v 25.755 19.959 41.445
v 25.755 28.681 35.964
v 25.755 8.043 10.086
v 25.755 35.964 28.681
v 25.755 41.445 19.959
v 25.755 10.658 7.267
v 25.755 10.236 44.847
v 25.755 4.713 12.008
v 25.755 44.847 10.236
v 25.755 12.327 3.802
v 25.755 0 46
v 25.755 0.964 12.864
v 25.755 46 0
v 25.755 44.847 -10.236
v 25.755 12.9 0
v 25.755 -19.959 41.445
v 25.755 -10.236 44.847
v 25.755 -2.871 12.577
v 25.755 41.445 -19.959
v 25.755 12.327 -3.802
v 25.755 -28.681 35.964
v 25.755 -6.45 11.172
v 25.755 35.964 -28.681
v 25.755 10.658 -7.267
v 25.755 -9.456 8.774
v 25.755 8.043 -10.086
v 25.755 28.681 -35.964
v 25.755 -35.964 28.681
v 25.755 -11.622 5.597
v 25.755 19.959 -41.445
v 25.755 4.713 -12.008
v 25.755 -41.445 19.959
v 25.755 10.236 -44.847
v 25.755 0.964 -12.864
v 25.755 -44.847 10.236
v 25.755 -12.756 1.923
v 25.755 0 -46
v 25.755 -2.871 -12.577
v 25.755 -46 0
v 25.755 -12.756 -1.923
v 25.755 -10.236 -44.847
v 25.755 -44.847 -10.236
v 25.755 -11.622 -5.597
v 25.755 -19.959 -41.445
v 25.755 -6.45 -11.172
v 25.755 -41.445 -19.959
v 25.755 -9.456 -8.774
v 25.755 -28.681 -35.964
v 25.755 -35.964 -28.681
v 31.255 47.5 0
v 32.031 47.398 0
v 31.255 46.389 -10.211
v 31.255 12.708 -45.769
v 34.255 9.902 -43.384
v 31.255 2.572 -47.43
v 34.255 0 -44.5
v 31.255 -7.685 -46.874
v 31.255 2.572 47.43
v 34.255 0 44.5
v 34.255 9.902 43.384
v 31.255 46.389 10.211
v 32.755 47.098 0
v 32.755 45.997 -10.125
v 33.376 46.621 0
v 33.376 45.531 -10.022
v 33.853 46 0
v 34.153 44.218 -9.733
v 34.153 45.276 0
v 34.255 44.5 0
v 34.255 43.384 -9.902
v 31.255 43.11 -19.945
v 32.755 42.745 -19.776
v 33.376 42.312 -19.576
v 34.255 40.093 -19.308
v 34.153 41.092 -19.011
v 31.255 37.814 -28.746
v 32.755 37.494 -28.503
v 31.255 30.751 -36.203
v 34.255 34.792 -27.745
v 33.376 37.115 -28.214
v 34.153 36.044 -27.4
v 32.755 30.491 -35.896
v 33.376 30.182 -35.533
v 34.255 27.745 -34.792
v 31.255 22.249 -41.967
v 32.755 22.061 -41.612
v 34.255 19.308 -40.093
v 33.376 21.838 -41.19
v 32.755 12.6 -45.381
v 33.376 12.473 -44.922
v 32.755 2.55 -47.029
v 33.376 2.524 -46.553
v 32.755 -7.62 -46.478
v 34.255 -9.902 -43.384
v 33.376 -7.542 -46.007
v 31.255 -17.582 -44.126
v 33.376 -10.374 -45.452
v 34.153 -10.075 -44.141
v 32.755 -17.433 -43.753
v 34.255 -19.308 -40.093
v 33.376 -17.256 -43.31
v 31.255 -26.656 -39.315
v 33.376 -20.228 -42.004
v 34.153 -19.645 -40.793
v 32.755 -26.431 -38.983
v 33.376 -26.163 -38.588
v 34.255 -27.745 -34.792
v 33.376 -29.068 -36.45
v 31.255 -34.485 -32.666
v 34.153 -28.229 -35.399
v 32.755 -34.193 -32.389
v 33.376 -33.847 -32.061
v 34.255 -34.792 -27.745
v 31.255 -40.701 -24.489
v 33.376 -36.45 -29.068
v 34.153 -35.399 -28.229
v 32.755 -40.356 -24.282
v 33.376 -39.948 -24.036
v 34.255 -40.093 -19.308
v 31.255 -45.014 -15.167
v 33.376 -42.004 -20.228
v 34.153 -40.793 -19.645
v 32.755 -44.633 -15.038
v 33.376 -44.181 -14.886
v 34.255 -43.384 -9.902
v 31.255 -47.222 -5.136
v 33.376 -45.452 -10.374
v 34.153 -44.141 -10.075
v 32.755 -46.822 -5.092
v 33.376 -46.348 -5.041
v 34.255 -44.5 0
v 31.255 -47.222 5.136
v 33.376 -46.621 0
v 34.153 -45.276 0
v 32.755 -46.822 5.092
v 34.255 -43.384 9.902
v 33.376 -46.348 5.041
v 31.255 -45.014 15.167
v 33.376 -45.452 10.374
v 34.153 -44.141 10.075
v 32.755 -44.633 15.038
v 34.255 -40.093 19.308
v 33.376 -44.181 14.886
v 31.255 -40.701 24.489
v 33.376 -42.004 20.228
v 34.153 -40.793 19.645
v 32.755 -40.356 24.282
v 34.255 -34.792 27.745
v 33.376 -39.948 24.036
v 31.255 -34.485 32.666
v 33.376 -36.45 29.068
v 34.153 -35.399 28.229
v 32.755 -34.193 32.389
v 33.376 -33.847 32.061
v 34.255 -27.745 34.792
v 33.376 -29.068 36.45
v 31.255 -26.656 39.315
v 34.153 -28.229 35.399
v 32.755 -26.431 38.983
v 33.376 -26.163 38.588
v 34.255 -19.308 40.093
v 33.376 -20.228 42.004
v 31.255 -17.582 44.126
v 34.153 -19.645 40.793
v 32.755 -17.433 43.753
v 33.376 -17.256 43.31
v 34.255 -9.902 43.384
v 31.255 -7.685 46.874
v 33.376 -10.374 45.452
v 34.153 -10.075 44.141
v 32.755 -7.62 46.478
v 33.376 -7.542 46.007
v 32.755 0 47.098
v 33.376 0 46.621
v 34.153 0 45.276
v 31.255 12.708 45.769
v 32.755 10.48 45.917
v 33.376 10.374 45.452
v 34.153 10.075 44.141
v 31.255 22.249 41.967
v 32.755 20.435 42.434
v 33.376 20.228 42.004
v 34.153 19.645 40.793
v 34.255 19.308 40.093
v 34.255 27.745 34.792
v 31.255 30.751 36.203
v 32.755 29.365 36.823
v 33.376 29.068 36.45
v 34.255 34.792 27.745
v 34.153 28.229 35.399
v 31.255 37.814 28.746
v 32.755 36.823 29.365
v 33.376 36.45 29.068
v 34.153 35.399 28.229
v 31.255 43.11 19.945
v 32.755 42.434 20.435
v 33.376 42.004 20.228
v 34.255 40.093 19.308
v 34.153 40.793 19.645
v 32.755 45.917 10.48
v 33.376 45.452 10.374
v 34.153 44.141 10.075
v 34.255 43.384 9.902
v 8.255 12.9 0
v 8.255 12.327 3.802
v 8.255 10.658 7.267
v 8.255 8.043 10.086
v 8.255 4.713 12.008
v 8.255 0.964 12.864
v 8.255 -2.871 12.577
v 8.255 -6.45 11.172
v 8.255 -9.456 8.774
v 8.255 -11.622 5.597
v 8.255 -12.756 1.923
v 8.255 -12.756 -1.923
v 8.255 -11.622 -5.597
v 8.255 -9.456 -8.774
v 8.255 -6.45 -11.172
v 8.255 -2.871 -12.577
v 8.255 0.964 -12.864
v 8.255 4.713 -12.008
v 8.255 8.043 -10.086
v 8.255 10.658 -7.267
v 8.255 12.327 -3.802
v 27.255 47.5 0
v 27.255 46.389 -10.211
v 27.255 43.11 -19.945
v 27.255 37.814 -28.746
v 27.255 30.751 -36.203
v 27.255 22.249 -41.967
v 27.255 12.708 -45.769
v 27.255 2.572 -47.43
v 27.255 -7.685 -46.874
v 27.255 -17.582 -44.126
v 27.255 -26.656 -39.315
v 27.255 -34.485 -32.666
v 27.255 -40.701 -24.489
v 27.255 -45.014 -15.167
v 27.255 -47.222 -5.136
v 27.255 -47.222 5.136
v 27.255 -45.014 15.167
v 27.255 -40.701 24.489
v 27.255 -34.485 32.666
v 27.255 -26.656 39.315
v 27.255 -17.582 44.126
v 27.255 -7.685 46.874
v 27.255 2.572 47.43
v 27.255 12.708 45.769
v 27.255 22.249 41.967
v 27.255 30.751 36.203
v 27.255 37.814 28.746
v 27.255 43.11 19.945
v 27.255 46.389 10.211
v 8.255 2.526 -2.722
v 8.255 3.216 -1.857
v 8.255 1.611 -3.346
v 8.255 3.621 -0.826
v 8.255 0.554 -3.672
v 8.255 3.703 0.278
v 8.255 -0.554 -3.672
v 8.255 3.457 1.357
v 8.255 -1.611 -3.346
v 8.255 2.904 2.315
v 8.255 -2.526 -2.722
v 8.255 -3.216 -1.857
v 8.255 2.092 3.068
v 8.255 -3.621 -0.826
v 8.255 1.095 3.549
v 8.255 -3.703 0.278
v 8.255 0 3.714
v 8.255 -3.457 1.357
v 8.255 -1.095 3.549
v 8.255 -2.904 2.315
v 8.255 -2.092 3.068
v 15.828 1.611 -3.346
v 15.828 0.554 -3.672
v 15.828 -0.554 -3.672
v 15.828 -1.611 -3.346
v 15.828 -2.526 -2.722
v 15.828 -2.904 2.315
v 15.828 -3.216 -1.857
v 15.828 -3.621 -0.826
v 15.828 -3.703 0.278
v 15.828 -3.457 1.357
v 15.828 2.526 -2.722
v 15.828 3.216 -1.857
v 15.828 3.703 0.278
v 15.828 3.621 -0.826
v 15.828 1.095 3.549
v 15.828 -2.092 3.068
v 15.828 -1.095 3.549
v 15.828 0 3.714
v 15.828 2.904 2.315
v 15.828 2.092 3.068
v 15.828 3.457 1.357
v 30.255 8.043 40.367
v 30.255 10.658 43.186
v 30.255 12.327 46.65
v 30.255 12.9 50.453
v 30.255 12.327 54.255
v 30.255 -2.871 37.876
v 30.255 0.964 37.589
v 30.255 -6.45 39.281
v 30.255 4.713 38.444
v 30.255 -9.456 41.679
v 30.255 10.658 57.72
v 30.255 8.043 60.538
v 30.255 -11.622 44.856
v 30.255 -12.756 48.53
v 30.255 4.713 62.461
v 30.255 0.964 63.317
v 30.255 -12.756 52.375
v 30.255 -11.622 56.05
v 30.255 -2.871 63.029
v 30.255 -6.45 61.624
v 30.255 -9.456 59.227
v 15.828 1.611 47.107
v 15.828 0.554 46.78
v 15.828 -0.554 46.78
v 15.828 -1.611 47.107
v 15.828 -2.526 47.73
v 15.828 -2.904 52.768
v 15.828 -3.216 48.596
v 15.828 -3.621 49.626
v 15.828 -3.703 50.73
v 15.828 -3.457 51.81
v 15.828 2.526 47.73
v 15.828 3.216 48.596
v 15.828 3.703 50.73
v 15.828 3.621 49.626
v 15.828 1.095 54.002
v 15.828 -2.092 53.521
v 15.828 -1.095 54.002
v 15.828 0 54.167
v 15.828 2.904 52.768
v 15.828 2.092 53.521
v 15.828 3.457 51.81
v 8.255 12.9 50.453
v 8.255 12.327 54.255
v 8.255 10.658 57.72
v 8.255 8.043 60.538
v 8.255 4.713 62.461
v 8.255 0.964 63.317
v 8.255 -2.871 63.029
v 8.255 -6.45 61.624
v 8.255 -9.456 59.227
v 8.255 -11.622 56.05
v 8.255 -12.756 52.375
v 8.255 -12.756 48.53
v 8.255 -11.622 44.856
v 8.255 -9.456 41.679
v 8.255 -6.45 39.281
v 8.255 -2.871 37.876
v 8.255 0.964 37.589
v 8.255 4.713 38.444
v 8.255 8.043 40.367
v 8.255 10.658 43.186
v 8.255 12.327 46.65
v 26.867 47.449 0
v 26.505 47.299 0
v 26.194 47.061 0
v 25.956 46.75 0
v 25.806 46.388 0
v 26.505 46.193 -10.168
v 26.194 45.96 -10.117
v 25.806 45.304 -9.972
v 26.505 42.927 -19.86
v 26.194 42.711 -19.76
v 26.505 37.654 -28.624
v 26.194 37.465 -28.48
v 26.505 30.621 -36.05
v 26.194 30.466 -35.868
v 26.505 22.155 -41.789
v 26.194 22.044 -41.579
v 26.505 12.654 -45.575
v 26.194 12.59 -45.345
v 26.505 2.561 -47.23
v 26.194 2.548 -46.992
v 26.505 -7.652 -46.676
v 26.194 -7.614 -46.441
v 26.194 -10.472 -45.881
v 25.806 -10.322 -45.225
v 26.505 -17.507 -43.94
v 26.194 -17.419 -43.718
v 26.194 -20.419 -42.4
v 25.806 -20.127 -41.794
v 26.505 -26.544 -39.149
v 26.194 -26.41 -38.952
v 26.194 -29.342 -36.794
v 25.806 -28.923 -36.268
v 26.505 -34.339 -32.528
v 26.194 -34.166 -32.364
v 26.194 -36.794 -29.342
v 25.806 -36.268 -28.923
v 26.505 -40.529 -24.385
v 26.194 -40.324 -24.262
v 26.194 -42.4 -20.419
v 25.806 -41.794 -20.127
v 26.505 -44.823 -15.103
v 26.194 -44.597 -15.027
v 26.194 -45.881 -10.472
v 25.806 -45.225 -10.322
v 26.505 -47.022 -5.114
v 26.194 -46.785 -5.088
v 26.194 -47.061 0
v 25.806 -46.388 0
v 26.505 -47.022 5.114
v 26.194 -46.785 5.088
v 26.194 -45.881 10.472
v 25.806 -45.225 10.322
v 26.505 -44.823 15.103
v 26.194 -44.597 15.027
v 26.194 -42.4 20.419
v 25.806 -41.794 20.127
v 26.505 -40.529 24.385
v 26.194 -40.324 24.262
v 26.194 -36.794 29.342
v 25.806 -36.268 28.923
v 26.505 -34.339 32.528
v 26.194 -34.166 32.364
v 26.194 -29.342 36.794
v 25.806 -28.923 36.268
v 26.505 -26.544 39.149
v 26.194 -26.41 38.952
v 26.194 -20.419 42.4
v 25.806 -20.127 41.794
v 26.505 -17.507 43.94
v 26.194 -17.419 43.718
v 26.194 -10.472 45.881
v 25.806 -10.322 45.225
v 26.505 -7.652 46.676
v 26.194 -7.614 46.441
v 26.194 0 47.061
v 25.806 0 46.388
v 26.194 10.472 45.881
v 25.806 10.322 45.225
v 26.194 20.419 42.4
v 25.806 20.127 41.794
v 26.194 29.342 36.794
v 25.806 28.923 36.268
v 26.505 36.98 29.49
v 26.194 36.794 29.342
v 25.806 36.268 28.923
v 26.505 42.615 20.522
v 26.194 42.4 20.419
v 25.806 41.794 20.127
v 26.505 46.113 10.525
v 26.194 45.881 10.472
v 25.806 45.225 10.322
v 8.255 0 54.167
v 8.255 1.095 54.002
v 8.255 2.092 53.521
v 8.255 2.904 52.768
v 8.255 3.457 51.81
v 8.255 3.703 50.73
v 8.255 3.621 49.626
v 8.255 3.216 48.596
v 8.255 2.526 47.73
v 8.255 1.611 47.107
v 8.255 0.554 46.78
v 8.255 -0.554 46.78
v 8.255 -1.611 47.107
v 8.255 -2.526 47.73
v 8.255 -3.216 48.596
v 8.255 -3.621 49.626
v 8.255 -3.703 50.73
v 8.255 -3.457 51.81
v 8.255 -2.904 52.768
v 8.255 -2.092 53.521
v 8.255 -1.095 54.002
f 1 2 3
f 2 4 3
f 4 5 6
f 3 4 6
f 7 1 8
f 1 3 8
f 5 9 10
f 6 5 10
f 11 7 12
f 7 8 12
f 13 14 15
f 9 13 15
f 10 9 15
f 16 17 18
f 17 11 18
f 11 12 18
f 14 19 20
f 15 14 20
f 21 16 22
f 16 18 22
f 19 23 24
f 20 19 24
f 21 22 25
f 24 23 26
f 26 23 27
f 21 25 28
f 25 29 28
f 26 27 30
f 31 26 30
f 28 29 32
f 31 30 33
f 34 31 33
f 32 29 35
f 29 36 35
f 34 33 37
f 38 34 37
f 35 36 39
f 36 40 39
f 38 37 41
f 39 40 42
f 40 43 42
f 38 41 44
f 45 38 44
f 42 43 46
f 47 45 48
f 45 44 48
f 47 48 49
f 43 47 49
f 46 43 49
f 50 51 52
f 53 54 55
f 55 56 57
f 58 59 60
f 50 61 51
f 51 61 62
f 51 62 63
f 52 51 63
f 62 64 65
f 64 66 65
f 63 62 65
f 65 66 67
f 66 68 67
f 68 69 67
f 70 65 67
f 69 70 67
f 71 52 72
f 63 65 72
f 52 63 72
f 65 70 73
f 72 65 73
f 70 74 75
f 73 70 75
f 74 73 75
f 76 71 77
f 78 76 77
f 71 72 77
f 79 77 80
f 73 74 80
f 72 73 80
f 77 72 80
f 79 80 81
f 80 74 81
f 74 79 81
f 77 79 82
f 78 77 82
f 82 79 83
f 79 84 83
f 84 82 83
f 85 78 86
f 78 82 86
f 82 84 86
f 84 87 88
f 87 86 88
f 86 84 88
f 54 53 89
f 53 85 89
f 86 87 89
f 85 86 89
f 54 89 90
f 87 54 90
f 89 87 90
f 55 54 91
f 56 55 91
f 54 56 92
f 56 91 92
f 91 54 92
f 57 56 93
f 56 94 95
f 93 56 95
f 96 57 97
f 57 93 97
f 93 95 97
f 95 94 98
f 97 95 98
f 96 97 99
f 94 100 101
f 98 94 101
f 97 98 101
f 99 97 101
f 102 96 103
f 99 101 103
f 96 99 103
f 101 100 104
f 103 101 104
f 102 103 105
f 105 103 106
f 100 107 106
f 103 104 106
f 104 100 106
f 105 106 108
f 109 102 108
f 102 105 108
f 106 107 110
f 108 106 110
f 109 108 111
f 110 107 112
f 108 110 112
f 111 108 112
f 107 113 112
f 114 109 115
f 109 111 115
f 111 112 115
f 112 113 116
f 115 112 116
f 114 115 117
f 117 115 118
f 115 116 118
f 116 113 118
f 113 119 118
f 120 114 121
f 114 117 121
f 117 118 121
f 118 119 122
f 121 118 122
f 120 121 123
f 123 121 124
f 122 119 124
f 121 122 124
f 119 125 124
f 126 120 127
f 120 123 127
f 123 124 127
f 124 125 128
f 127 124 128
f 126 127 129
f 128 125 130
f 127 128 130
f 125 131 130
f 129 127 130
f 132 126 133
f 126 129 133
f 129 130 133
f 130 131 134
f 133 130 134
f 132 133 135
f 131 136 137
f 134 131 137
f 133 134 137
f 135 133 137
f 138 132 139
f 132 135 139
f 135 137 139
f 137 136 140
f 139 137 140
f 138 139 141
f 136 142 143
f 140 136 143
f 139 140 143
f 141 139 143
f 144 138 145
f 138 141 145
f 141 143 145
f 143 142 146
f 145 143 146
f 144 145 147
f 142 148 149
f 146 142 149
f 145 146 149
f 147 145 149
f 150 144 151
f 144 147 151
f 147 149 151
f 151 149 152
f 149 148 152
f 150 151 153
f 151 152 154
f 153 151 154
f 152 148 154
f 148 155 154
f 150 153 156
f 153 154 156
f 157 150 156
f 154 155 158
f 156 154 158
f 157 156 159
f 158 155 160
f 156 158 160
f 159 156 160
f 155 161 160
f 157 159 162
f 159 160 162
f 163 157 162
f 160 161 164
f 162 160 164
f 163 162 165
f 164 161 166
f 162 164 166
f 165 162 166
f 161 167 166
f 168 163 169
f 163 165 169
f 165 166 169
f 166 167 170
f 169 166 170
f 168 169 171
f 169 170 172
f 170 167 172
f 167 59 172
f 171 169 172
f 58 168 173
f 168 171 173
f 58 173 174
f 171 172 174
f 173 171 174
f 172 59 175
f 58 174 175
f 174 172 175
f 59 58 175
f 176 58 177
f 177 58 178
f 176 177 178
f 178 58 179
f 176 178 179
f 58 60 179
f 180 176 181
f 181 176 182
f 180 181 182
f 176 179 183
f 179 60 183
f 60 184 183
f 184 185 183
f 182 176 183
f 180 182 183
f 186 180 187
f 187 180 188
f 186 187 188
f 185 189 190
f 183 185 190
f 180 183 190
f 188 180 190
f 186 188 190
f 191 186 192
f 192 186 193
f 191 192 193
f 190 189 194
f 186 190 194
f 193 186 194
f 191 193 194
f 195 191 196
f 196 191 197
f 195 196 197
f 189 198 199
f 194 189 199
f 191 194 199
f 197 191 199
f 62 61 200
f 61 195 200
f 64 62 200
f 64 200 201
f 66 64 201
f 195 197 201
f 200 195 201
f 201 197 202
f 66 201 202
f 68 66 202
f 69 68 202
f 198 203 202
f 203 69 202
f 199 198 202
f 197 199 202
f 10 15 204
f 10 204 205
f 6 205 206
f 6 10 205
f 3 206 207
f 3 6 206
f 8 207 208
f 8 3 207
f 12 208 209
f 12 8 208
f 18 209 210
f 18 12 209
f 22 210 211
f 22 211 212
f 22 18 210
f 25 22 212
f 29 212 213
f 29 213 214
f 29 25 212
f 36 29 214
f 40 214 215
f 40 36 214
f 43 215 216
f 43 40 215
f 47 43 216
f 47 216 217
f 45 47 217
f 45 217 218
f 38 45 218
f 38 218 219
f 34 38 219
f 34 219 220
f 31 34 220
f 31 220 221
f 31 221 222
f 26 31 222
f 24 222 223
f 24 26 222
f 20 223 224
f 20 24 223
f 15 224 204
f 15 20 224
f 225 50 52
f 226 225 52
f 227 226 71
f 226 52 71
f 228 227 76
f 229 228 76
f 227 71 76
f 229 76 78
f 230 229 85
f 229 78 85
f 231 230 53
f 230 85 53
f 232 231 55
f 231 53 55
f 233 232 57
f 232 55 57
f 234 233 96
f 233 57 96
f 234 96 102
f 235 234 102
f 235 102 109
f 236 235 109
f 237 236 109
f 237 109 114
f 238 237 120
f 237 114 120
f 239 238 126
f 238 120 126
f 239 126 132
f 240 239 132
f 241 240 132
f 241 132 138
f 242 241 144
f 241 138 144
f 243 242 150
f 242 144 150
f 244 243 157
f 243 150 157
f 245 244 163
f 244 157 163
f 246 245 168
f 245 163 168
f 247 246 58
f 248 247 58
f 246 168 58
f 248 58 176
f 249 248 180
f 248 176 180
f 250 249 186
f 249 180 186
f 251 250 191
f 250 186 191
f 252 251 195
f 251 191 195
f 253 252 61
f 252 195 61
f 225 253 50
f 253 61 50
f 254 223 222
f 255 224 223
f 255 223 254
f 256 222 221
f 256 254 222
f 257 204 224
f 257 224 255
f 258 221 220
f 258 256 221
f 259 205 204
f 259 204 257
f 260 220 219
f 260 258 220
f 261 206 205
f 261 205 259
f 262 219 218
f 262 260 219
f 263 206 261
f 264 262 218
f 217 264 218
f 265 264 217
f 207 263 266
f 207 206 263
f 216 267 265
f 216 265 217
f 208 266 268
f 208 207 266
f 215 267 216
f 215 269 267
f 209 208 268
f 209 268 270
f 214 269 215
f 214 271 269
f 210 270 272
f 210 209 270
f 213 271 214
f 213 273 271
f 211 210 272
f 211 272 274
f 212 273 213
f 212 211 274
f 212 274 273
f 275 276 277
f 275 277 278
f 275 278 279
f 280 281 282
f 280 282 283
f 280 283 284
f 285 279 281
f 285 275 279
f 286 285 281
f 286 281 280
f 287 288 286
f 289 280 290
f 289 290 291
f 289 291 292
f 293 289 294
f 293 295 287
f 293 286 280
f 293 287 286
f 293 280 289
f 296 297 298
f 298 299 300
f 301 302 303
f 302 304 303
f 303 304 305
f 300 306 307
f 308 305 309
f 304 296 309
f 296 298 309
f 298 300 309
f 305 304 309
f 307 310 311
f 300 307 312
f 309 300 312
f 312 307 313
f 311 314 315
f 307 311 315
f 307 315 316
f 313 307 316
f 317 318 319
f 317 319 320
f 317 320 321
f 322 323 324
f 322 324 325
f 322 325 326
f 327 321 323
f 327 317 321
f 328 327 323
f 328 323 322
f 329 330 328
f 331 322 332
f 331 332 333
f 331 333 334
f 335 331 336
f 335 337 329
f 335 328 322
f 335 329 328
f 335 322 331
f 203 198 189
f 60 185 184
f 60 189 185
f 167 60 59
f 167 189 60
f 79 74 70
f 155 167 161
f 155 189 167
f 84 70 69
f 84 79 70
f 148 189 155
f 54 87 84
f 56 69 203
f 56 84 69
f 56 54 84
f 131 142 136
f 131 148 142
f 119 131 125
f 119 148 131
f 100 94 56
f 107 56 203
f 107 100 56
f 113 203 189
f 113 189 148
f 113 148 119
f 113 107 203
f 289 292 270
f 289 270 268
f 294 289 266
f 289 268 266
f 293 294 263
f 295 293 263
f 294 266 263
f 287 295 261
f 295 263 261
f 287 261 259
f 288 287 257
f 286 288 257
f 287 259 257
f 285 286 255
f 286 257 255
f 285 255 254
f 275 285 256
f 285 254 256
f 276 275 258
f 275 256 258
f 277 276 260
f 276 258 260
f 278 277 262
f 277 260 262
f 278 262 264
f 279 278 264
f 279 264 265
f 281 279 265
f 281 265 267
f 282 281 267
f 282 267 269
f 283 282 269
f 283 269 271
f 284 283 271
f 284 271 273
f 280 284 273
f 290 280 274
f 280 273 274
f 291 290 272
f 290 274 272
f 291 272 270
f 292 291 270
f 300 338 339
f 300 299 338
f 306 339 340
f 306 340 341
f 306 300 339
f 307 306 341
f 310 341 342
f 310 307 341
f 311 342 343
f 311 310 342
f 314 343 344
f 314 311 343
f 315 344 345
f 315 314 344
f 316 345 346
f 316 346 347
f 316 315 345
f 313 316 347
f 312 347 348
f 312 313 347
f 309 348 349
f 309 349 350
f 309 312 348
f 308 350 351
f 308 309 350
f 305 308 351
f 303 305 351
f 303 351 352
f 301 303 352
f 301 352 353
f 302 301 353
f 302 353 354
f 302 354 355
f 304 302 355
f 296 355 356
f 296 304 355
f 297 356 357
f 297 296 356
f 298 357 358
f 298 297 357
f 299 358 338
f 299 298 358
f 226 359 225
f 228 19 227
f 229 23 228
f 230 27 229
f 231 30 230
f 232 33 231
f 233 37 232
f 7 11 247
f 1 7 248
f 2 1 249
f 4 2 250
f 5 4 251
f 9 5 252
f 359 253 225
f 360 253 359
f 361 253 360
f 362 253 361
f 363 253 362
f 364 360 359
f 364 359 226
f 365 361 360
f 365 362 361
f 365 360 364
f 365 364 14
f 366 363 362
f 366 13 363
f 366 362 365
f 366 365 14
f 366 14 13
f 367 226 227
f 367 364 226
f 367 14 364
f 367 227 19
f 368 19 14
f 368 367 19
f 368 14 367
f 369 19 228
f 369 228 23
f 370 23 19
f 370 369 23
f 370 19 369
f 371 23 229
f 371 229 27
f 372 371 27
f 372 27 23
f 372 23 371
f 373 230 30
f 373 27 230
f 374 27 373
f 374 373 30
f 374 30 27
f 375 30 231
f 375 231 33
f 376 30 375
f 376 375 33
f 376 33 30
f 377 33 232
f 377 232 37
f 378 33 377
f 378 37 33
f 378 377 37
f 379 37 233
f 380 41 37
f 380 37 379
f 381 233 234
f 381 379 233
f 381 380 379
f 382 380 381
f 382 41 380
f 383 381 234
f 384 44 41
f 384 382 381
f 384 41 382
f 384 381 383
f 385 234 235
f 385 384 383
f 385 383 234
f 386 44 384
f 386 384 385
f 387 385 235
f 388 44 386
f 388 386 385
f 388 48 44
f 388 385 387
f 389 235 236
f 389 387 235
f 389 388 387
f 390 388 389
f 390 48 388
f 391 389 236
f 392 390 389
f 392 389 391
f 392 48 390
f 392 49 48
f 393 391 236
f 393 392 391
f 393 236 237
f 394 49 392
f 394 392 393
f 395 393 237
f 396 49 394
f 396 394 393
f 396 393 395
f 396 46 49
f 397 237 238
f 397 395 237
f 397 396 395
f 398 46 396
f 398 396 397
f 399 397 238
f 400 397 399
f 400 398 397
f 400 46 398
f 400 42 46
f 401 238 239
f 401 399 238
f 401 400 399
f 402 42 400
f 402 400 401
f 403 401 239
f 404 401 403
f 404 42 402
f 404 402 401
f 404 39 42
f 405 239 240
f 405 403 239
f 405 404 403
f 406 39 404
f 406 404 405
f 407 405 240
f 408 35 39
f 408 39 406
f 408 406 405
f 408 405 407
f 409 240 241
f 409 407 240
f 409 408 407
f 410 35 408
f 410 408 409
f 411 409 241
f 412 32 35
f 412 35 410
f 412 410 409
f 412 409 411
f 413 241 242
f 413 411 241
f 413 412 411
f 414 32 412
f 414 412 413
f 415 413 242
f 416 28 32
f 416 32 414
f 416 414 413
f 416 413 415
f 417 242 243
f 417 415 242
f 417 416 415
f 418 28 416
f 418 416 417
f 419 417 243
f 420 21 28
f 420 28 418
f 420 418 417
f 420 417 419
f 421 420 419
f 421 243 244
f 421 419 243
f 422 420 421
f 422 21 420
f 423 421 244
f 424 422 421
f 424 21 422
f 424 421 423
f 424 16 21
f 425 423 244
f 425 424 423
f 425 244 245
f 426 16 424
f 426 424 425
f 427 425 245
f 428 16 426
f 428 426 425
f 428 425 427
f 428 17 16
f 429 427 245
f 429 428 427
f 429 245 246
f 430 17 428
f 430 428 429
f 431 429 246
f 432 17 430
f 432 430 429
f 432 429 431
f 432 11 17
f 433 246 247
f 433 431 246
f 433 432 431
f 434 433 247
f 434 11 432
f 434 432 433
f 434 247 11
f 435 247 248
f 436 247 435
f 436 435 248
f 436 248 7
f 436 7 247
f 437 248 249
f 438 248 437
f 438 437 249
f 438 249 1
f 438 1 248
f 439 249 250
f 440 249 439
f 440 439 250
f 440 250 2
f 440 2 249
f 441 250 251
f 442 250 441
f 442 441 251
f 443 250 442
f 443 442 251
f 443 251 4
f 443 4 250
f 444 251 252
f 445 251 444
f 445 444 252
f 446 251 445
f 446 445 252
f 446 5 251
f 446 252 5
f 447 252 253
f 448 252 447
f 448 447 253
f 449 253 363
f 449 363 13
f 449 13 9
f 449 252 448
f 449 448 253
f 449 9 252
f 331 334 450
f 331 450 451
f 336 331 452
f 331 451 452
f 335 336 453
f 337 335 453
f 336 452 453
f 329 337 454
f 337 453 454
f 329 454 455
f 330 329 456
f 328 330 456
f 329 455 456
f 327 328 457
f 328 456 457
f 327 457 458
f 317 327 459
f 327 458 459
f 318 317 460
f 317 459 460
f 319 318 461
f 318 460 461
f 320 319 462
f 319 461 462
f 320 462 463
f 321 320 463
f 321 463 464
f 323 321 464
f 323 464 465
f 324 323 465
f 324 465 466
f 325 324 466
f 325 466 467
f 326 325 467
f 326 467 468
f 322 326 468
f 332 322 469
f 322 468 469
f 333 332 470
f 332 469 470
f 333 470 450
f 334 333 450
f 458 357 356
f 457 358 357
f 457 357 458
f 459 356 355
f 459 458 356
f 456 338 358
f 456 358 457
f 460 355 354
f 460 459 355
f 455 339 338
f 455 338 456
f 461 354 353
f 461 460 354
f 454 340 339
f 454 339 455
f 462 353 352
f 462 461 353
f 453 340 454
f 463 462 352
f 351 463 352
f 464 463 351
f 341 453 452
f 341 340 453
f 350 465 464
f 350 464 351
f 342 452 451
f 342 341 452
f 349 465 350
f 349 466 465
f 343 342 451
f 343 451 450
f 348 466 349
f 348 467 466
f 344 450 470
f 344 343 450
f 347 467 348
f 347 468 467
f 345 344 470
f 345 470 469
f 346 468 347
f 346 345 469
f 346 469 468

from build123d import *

# Parameters (mm, degrees)
SKETCH1_W          = 22
SKETCH1_H          = 12.9
SKETCH2_R          = 3.71375
CUT_EXTRUDE1_DEPTH = 7.5725
SKETCH5_W          = 8.5
SKETCH5_H          = 47.5
FILLET1_R          = 3
FILLET2_R          = 1.5


with BuildPart() as part:
    # Sketch1 → Revolve1 (revolve)
    with BuildSketch(Plane.XY):
        with Locations((19.255, 6.45)):
            Rectangle(SKETCH1_W, SKETCH1_H)
    revolve(axis=Axis((8.255, 0, 0), (1, 0, 0)))

    # Sketch2 → Cut-Extrude1 (cut)
    with BuildSketch(Plane.ZY.offset(-8.255)):
        Circle(SKETCH2_R)
    extrude(amount=-CUT_EXTRUDE1_DEPTH, mode=Mode.SUBTRACT)


with BuildPart() as body_2:
    # Body-Move/Copy1: copy of part
    add(part.part.moved(Location((0, 0, 50.452769062))))


with BuildPart() as part_1:
    add(part.part)

    # Sketch5 → Revolve2 (revolve)
    with BuildSketch(Plane.XY):
        with Locations((30.005, 23.75)):
            Rectangle(SKETCH5_W, SKETCH5_H)
    revolve(axis=Axis((34.255, 0, 0), (-1, 0, 0)))

    # Fillet1
    fillet1_edges = [part_1.edges().sort_by_distance(p)[0] for p in [
        (34.255, -47.5, 0),
    ]]
    fillet(fillet1_edges, radius=FILLET1_R)

    # Fillet2
    fillet2_edges = [part_1.edges().sort_by_distance(p)[0] for p in [
        (25.755, -47.5, 0),
    ]]
    fillet(fillet2_edges, radius=FILLET2_R)


solid = Compound([body_2.part, part_1.part])
